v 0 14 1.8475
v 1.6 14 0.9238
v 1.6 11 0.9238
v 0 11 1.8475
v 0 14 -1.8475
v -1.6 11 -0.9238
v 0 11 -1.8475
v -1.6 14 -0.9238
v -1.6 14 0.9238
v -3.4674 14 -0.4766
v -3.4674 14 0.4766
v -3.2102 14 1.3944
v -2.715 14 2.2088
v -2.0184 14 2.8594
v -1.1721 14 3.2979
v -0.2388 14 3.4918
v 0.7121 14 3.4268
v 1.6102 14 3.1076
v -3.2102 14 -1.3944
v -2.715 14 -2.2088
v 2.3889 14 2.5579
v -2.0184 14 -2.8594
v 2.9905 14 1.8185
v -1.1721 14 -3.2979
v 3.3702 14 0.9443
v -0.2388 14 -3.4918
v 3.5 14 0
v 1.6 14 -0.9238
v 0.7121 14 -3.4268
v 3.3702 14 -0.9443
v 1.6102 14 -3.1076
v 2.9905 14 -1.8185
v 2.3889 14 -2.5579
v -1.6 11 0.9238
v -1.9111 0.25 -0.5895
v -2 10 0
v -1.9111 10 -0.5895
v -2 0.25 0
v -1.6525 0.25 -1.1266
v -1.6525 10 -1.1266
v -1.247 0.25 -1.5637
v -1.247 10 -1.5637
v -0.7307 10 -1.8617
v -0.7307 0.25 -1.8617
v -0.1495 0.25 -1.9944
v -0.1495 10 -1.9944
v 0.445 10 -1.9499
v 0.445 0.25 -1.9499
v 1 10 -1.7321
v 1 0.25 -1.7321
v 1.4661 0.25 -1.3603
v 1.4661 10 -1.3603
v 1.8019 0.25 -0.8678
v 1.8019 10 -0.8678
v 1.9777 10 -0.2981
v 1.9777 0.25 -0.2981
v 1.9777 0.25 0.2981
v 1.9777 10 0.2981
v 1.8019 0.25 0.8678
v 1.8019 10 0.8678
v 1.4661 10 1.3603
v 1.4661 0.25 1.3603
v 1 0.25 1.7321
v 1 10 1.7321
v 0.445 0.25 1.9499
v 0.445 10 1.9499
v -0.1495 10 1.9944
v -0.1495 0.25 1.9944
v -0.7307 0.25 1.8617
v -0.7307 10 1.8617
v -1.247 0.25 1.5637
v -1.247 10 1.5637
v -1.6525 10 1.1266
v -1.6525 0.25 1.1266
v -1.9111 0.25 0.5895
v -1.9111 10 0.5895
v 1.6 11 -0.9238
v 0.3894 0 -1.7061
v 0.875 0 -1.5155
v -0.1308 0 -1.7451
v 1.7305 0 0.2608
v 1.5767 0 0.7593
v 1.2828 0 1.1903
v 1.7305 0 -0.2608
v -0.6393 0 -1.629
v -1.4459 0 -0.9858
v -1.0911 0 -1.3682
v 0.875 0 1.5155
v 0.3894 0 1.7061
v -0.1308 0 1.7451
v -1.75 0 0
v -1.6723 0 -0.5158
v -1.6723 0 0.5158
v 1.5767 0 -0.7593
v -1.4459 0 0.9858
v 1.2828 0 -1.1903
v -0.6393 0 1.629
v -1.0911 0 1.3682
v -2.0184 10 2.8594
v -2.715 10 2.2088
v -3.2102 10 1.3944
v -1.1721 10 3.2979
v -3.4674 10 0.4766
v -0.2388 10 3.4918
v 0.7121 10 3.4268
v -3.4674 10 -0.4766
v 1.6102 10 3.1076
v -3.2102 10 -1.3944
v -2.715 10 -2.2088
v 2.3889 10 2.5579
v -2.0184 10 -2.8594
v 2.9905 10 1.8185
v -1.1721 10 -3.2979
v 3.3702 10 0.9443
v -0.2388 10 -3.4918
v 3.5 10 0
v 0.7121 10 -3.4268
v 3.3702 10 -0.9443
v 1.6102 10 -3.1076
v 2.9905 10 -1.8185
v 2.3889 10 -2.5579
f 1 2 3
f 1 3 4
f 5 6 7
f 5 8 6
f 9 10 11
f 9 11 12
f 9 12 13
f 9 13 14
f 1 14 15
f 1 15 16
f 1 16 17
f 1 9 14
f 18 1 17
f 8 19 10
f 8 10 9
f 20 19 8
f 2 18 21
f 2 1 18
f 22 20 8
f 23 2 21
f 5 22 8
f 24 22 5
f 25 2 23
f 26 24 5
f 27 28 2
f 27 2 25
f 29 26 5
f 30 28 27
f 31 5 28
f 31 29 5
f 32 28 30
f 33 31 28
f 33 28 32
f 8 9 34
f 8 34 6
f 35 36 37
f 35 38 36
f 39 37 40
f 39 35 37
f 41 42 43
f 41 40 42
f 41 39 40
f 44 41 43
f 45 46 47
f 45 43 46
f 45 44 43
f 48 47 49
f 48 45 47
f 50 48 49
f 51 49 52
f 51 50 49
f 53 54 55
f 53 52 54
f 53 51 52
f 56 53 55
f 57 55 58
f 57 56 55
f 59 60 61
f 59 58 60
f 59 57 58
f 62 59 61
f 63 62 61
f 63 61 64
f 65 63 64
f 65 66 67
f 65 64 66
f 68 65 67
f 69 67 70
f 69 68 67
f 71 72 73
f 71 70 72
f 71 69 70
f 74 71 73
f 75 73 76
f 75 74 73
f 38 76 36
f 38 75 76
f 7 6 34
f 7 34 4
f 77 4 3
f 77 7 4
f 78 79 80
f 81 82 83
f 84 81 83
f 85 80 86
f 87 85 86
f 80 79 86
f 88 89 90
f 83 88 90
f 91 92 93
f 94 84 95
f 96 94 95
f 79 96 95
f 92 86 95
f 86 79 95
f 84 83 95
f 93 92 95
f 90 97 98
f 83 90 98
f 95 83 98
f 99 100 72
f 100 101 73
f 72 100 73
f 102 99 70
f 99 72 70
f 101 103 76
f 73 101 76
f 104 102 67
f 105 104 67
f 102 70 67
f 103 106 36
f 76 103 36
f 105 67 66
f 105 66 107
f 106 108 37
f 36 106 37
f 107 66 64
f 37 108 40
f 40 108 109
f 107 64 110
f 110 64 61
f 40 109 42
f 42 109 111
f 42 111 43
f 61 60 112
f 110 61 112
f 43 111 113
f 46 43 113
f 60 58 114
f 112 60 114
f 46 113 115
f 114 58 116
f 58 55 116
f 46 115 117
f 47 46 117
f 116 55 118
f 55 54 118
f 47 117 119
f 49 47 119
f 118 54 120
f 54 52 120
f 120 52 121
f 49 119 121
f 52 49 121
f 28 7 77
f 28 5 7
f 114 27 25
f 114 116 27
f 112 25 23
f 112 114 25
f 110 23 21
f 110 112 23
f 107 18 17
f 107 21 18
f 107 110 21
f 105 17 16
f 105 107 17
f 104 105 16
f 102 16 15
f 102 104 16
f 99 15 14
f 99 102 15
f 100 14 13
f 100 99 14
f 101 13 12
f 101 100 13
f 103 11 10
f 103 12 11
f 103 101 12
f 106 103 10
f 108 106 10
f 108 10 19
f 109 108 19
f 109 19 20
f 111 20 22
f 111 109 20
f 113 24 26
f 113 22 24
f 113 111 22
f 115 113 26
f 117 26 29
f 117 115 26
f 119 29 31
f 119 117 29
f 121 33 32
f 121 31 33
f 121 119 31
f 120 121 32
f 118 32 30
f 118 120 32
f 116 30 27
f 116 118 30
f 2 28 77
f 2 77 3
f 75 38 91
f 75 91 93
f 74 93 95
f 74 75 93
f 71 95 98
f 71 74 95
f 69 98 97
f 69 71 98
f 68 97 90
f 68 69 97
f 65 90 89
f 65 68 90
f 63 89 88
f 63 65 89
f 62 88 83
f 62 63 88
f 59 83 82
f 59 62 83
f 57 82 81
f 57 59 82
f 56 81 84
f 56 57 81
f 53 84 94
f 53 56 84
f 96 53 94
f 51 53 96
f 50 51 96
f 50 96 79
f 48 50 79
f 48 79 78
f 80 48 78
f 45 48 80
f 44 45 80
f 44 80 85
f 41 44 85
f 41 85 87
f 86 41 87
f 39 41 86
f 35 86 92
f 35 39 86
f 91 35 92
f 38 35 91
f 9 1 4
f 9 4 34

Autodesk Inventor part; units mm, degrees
ref_plane "YZ Plane" through (0, 0, 0) normal (1, 0, 0) x (0, 1, 0)
ref_plane "XZ Plane" through (0, 0, 0) normal (0, 1, 0) x (-1, 0, 0)
ref_plane "XY Plane" through (0, 0, 0) normal (0, 0, 1) x (1, 0, 0)
sketch "Sketch1" plane through (0, 0, 0) normal (0, 1, 0) x (-1, 0, 0)
  circle A0 centre (0, 0) radius 2
  dimension "d0" = 4
extrude "Extrusion1" add sketch "Sketch1" along normal blind 10
sketch "Sketch2" plane through (0, 10, 0) normal (0, 1, 0) x (1, 0, 0)
  circle A0 centre (0, 0) radius 2 projected
  circle A1 centre (0, 0) radius 3.5
  dimension "d3" = 7
extrude "Extrusion2" add sketch "Sketch2" along normal blind 4 contours A0 | A1
sketch "Sketch3" plane through (0, 14, 0) normal (0, 1, 0) x (1, 0, 0)
  circle A0 centre (0, 0) radius 3.5 projected
  line L0 (0, 1.8475) -> (1.6, 0.9238)
  line L1 (1.6, 0.9238) -> (1.6, -0.9238)
  line L2 (1.6, -0.9238) -> (0, -1.8475)
  line L3 (0, -1.8475) -> (-1.6, -0.9238)
  line L4 (-1.6, -0.9238) -> (-1.6, 0.9238)
  line L5 (-1.6, 0.9238) -> (0, 1.8475)
  dimension "d6" = 1.6
extrude "Extrusion3" cut sketch "Sketch3" against normal blind 3 contours L0 L1 L2 L3 L4 L5
thread "Thread1" size "M4x0.7" class "6g" standard "ANSI Metric M Profile" full length
chamfer "Chamfer1" distance 0.25 angle 45 1 edges at (2, 0, 0)
properties part number "M4x10SHCS"
